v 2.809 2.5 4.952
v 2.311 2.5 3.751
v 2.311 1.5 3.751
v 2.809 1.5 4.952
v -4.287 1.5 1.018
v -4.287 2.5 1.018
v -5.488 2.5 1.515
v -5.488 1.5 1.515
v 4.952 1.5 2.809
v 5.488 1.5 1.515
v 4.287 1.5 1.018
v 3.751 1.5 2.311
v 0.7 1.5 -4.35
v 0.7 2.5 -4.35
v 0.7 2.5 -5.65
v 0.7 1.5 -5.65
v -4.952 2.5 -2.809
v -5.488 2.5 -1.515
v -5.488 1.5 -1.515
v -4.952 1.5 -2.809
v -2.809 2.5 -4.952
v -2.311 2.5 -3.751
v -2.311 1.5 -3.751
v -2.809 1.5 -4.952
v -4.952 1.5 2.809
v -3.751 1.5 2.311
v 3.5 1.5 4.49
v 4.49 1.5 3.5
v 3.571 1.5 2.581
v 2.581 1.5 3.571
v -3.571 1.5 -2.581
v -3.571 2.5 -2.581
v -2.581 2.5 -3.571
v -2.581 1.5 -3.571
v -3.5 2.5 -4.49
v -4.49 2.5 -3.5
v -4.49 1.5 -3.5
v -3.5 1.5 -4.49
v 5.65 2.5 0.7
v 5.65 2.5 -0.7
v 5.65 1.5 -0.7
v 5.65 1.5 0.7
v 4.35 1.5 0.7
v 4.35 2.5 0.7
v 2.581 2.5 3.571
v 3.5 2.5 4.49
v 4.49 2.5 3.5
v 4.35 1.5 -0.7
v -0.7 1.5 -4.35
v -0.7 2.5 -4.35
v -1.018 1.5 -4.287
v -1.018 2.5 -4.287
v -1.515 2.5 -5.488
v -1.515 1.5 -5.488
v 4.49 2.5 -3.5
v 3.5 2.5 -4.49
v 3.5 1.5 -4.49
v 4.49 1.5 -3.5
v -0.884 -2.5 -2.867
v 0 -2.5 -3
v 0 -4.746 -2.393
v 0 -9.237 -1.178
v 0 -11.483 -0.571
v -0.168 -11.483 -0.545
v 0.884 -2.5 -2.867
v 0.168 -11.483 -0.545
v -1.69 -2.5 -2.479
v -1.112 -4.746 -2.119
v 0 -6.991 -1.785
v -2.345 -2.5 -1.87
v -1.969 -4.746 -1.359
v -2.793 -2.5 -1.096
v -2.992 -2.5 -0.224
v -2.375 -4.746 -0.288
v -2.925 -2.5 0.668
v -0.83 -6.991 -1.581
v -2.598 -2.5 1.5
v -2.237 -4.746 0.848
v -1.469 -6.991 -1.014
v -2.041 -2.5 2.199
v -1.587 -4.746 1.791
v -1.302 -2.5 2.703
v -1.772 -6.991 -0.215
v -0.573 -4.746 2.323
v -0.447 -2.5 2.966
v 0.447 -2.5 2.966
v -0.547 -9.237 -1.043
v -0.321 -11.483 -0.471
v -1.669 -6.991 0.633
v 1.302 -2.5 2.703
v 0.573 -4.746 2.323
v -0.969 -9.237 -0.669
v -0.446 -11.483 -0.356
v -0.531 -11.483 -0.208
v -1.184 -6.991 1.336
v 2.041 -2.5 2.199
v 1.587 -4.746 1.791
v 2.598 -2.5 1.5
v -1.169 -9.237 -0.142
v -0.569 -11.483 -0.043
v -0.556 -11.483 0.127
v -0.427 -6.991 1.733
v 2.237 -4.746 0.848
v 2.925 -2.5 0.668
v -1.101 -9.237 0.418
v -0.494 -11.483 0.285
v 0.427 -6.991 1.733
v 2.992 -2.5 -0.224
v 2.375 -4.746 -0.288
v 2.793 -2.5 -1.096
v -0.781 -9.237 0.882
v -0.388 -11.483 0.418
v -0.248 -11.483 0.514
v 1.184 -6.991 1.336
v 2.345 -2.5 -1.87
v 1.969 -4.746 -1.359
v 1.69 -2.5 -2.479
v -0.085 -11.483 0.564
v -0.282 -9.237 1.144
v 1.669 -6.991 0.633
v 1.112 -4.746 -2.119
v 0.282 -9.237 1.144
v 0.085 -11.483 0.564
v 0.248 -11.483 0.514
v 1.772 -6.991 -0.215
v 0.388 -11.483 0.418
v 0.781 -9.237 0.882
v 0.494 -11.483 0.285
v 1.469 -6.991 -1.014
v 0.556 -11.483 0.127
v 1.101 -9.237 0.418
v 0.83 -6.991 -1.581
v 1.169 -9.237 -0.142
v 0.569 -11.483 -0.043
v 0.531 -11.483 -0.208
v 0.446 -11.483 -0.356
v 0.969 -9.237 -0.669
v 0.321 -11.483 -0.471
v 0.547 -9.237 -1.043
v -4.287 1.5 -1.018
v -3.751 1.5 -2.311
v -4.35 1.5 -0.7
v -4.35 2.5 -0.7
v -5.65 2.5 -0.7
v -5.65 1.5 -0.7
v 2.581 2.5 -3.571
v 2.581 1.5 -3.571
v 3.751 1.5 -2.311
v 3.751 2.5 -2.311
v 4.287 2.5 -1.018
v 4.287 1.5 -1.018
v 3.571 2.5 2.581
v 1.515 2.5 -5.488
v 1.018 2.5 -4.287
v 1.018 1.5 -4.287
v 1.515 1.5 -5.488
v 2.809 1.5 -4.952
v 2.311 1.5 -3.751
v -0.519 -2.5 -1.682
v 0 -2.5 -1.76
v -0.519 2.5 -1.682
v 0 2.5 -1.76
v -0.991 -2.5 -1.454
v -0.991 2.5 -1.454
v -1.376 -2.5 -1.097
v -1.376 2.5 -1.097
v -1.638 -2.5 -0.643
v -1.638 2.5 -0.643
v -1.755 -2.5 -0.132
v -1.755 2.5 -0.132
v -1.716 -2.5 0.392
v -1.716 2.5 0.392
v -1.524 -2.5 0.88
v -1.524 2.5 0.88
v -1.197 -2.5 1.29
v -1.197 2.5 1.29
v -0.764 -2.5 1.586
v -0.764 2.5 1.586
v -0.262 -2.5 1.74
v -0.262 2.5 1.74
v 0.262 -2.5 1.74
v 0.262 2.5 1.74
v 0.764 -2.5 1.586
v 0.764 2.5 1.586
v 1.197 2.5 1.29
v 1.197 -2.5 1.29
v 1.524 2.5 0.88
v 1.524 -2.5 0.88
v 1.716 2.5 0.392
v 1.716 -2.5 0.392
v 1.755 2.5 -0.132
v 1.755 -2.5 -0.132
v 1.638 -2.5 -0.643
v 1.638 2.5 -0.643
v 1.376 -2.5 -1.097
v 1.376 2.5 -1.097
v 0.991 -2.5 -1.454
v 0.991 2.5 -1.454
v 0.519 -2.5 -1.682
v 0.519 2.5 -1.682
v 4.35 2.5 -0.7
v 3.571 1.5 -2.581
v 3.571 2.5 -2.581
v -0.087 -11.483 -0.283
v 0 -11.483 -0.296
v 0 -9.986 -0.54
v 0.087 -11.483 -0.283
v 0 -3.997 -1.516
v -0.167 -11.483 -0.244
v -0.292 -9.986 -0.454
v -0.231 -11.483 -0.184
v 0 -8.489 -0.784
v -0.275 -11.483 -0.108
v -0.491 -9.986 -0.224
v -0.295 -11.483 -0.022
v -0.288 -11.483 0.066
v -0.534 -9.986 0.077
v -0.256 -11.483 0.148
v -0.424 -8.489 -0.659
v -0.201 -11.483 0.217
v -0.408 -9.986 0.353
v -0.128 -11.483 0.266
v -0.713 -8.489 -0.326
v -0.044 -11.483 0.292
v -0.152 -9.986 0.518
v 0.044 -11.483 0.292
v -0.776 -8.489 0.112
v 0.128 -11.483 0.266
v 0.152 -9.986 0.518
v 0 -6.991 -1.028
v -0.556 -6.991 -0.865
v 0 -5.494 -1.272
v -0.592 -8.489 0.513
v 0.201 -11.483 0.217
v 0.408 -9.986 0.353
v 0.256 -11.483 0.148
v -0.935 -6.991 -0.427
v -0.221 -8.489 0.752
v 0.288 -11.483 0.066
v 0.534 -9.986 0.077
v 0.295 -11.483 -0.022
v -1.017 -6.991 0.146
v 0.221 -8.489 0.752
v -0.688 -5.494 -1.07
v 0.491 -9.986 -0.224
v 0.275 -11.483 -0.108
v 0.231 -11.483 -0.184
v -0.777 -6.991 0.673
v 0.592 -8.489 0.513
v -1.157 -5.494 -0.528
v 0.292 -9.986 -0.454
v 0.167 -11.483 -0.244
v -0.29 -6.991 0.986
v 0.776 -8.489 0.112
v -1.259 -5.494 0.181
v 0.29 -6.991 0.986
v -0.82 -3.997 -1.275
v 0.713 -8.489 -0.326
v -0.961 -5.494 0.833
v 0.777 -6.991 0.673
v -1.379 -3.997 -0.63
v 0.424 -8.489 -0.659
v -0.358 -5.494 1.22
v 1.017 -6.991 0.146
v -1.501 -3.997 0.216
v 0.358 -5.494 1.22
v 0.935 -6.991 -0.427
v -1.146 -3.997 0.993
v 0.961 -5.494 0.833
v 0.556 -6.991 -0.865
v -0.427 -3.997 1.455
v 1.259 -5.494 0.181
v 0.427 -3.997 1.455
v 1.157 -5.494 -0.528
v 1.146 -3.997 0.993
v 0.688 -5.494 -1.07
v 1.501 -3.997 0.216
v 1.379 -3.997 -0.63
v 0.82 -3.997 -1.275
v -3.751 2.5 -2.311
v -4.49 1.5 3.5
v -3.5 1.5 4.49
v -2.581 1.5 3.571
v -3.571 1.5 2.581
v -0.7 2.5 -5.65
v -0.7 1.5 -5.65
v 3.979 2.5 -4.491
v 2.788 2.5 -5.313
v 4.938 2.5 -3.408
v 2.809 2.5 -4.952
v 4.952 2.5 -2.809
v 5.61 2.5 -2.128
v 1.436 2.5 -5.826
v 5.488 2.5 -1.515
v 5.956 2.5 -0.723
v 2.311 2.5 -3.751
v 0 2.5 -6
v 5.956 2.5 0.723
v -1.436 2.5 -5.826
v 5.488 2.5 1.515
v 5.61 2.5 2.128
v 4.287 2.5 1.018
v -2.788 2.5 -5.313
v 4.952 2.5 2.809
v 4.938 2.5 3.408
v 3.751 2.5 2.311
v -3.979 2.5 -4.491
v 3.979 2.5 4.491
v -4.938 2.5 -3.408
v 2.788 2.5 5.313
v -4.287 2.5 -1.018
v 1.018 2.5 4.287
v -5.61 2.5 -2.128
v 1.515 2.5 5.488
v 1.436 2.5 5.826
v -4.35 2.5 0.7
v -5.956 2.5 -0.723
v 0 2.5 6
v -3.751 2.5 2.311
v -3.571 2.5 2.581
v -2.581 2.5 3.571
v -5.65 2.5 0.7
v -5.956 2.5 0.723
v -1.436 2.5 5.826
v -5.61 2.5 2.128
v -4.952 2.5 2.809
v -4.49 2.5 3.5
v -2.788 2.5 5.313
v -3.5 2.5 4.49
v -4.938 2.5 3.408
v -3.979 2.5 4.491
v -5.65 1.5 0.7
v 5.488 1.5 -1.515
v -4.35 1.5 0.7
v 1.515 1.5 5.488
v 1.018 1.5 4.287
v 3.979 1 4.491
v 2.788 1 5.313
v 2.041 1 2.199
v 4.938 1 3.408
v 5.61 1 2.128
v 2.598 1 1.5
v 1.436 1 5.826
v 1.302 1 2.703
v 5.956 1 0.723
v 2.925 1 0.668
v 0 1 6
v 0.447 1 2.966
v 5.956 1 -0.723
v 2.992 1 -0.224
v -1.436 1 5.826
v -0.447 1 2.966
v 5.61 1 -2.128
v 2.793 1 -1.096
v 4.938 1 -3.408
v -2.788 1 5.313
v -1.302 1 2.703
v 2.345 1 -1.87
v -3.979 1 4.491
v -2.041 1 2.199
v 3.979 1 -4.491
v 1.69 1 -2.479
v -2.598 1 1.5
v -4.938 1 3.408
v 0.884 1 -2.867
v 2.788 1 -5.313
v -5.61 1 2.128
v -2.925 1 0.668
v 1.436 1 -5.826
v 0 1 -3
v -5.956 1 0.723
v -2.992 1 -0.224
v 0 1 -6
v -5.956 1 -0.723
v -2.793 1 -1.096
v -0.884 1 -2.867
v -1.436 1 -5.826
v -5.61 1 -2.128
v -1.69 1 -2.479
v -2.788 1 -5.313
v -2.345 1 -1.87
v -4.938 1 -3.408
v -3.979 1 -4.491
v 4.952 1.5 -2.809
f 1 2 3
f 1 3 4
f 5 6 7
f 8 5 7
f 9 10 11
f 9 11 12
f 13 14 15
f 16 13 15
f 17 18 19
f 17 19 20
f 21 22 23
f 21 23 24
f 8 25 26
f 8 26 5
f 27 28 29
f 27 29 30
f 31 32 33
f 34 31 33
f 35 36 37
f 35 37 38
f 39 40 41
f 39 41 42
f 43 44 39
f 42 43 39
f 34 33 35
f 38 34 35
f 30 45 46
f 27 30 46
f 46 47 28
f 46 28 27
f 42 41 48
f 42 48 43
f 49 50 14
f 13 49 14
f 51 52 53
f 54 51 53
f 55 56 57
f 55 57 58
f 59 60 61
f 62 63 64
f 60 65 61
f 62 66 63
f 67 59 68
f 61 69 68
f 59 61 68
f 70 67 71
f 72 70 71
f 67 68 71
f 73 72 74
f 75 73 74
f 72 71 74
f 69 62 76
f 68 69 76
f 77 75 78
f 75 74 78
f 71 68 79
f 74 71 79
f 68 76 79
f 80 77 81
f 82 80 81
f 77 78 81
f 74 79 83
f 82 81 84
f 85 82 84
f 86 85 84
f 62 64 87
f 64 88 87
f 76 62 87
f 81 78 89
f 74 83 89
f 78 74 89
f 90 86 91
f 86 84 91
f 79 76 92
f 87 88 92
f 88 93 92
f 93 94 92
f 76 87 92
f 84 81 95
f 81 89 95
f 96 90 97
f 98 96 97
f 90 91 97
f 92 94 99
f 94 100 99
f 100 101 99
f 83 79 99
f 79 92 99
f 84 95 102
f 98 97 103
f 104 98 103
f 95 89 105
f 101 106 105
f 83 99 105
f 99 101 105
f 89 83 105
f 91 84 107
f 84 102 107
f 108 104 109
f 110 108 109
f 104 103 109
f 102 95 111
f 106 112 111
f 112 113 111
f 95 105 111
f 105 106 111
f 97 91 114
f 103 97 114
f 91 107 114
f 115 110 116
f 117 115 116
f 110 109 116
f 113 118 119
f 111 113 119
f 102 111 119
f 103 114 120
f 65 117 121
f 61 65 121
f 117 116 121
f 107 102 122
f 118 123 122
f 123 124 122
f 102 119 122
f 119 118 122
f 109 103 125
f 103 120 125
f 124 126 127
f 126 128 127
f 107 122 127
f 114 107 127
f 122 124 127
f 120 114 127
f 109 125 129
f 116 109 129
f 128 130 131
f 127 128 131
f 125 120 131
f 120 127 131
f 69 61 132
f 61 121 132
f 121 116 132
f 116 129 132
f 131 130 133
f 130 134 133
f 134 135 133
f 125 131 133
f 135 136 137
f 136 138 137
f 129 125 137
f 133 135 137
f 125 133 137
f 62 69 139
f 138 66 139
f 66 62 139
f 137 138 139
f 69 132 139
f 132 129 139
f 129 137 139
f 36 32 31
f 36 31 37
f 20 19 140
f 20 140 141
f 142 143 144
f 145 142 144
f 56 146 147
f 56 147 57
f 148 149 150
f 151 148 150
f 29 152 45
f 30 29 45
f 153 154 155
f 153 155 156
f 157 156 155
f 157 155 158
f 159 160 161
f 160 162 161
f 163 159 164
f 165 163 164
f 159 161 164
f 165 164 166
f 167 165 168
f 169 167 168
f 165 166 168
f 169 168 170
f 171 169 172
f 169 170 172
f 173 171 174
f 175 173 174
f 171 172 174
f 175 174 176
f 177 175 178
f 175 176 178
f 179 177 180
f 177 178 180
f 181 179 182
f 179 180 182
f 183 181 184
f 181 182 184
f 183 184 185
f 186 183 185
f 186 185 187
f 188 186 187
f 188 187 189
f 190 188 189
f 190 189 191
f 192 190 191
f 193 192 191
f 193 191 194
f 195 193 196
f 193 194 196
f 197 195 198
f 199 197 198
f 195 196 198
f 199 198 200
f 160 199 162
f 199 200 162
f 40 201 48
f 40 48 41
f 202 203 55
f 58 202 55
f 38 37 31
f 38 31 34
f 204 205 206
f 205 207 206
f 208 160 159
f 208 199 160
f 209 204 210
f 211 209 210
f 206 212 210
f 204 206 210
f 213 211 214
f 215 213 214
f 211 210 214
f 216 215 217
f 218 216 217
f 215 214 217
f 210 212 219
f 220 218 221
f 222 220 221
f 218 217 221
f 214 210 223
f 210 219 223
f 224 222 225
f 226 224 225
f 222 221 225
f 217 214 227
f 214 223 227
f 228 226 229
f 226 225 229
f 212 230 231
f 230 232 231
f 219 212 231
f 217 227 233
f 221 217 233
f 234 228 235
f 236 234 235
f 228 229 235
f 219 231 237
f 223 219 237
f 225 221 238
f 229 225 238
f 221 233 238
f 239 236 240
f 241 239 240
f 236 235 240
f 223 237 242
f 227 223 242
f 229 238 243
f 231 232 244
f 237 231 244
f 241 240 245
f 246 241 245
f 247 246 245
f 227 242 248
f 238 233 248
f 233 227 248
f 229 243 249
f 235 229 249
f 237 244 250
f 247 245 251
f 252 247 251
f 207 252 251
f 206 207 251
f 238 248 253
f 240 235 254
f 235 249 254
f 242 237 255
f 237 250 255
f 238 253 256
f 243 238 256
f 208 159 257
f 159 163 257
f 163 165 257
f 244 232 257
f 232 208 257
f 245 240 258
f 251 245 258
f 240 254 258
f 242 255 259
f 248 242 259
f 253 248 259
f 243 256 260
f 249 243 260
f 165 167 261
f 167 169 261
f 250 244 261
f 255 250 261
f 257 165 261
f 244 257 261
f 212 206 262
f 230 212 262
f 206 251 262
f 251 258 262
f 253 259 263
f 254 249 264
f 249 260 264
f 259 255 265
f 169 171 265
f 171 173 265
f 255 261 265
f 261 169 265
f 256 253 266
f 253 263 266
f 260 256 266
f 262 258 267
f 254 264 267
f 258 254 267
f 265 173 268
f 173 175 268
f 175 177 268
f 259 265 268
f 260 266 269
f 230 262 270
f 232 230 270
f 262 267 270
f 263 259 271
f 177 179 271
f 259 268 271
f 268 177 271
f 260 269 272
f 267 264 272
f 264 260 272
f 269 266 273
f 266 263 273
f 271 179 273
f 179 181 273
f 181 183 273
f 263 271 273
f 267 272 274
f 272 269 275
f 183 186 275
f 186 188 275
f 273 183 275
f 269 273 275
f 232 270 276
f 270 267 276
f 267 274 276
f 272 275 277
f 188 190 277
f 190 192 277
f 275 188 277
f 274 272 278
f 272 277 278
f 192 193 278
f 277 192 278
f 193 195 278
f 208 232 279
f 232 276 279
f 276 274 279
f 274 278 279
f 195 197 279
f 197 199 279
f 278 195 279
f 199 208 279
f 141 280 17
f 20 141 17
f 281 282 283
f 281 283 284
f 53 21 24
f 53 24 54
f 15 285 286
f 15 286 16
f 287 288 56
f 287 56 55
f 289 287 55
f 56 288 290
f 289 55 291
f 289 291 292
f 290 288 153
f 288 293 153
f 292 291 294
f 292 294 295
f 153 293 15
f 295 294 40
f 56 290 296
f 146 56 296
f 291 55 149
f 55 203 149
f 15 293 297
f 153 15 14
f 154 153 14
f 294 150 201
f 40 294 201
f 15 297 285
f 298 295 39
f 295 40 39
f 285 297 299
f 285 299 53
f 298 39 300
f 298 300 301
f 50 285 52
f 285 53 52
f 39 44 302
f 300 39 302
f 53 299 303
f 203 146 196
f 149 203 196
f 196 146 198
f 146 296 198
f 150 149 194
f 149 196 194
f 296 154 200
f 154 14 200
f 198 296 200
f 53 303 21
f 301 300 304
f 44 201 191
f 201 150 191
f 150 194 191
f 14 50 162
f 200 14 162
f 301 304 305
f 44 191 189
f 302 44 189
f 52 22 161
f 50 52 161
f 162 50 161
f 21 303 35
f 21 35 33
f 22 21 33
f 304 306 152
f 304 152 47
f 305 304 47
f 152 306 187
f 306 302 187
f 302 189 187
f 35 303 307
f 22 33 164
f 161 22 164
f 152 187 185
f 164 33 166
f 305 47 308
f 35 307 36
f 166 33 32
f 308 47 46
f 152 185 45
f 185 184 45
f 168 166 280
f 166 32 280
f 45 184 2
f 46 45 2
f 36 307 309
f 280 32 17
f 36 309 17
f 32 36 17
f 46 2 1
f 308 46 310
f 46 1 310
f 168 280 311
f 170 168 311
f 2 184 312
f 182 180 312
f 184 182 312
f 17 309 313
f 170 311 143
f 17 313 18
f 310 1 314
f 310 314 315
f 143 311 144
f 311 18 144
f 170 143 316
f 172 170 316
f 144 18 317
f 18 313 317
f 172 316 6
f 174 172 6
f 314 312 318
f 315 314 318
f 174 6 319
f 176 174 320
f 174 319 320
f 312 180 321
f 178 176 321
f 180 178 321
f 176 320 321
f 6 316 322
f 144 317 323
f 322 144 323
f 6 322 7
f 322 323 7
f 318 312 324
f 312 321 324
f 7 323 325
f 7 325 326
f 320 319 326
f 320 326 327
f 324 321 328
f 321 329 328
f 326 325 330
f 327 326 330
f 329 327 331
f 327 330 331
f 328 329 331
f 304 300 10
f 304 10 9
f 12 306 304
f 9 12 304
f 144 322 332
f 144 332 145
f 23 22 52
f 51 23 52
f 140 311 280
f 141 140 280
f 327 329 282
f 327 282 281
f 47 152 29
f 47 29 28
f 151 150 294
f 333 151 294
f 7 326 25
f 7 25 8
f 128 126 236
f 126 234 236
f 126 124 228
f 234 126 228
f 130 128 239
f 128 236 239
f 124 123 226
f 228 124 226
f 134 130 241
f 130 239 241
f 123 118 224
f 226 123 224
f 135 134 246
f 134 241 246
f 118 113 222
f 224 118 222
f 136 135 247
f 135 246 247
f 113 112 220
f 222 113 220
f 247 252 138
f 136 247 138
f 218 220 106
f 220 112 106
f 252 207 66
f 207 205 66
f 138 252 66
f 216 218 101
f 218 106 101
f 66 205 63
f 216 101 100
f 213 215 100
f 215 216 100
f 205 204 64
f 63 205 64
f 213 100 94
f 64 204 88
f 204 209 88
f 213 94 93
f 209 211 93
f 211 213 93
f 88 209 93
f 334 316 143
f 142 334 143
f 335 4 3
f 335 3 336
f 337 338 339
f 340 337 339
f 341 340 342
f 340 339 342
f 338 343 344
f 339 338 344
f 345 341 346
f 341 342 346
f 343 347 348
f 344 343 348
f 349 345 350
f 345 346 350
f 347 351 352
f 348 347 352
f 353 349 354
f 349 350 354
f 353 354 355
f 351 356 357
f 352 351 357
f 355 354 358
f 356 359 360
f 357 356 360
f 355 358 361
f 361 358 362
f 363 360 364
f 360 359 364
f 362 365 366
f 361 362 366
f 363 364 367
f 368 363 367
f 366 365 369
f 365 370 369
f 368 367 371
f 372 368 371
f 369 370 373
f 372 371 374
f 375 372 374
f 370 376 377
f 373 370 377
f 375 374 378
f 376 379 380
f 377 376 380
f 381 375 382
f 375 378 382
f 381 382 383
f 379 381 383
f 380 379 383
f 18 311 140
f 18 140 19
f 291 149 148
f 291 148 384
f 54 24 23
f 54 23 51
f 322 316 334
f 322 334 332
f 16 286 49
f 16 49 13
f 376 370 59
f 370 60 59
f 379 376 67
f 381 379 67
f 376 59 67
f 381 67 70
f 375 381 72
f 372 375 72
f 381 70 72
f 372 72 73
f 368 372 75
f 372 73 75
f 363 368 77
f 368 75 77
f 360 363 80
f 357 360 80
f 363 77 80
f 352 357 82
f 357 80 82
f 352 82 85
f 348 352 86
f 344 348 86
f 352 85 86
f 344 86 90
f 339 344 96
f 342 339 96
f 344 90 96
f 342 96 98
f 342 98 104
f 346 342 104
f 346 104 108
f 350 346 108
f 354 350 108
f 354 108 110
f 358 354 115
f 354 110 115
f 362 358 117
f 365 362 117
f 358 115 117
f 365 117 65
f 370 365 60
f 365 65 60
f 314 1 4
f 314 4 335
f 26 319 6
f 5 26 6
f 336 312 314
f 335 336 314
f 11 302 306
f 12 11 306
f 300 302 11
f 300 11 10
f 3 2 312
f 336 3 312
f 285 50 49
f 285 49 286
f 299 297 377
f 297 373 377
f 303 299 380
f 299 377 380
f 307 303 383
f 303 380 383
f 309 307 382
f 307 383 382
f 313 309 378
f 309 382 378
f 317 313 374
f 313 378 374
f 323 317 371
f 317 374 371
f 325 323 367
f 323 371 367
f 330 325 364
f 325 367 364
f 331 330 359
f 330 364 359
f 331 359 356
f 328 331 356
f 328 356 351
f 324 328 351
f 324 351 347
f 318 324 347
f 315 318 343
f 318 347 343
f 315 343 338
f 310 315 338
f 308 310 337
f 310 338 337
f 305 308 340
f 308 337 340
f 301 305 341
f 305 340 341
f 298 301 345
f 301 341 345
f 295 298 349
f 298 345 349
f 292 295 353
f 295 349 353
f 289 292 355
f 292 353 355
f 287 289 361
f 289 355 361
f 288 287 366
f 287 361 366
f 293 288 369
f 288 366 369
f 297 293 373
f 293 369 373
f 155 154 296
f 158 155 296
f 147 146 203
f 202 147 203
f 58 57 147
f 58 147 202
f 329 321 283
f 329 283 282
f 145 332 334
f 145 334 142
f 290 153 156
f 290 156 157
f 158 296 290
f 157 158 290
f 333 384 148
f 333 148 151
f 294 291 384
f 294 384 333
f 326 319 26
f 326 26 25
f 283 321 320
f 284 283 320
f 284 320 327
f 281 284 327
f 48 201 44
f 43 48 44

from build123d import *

# Parameters (mm, degrees)
SKETCH2_W          = 1.4
SKETCH2_H          = 1.3
CUT_EXTRUDE1_DEPTH = 1
CIRPATTERN1_COUNT  = 16


with BuildPart() as part:
    # Sketch1 → Revolve1 (revolve)
    with BuildSketch(Plane(origin=(0, 0, 0), x_dir=(0, 0, -1), z_dir=(1, 0, 0))):
        Polygon((1.76, 2.5), (6, 2.5), (6, 1), (3, 1), (3, -2.5), (0.570548961, -11.482894875), (0.295700194, -11.482894875), (1.76, -2.5), align=None)
    revolve(axis=Axis((0, 0, 0), (0, 1, 0)))

    # Sketch2 → Cut-Extrude1 (cut)
    with BuildSketch(Plane(origin=(0, 2.5, 0), x_dir=(1, 0, 0), z_dir=(0, 1, 0))):
        with Locations((0, 5)):
            Rectangle(SKETCH2_W, SKETCH2_H)
    cut_extrude1 = extrude(amount=-CUT_EXTRUDE1_DEPTH, mode=Mode.SUBTRACT)

    # CirPattern1: Cut-Extrude1 ×16 about axis, 2 skipped
    cirpattern1_axis = Axis((0, 0, 0), (0, -1, 0))
    add([cut_extrude1.rotate(cirpattern1_axis, i * 360 / CIRPATTERN1_COUNT) for i in range(1, CIRPATTERN1_COUNT) if i not in (8, 9)], mode=Mode.SUBTRACT)


solid = part.part
